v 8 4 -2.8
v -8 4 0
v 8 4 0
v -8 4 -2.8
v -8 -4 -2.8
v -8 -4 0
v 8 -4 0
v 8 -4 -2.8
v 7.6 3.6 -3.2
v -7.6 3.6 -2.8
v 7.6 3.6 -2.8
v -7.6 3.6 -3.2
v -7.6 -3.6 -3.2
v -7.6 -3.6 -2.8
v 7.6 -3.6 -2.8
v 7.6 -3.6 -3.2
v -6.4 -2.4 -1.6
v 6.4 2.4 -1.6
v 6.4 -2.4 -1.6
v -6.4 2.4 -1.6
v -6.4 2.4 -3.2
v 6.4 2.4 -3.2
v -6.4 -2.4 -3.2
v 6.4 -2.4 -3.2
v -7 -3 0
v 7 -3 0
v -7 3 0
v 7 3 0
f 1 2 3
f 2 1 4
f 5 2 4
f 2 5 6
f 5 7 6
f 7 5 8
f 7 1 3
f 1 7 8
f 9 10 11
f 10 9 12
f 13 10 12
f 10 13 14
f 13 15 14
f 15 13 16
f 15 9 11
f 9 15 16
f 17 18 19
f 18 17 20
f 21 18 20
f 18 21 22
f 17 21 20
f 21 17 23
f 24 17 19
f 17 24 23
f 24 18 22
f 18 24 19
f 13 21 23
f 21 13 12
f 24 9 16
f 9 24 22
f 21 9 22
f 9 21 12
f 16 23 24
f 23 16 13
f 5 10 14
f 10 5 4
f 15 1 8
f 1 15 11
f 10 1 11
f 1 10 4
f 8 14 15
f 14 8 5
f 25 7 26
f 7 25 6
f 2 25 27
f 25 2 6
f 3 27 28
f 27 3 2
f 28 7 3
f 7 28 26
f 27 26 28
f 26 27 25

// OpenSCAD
// file: ../p/4-4edge.scad
use <../lib.scad>
$fa=1; $fs=0.2;
function ldraw_lib__4_4edge(realsolid=false) = [
// 0 Circle 1.0
// 0 Name: 4-4edge.dat
// 0 Author: James Jessiman
// 0 !LDRAW_ORG Primitive UPDATE 2017-01
// 0 !LICENSE Licensed under CC BY 2.0 and CC BY 4.0 : see CAreadme.txt
// 
// 0 BFC CERTIFY CCW
  [0,"BFC","CERTIFY"],
  [0,"BFC","CCW"],
// 
// 0 !HISTORY 1998-12-15 [PTadmin] Official Update 1998-10
// 0 !HISTORY 2005-12-28 [PTadmin] Official Update 2005-01
// 0 !HISTORY 2007-06-24 [PTadmin] Header formatted for Contributor Agreement
// 0 !HISTORY 2008-07-01 [PTadmin] Official Update 2008-01
// 0 !HISTORY 2017-01-15 [Steffen] BFCed
// 0 !HISTORY 2017-12-30 [PTadmin] Official Update 2017-01
// 
// 
// 2 24 1 0 0 0.9239 0 0.3827
  [2,24,1,0,0,0.9239,0,0.3827],
// 2 24 0.9239 0 0.3827 0.7071 0 0.7071
  [2,24,0.9239,0,0.3827,0.7071,0,0.7071],
// 2 24 0.7071 0 0.7071 0.3827 0 0.9239
  [2,24,0.7071,0,0.7071,0.3827,0,0.9239],
// 2 24 0.3827 0 0.9239 0 0 1
  [2,24,0.3827,0,0.9239,0,0,1],
// 2 24 0 0 1 -0.3827 0 0.9239
  [2,24,0,0,1,-0.3827,0,0.9239],
// 2 24 -0.3827 0 0.9239 -0.7071 0 0.7071
  [2,24,-0.3827,0,0.9239,-0.7071,0,0.7071],
// 2 24 -0.7071 0 0.7071 -0.9239 0 0.3827
  [2,24,-0.7071,0,0.7071,-0.9239,0,0.3827],
// 2 24 -0.9239 0 0.3827 -1 0 -0
  [2,24,-0.9239,0,0.3827,-1,0,-0],
// 2 24 -1 0 -0 -0.9239 0 -0.3827
  [2,24,-1,0,-0,-0.9239,0,-0.3827],
// 2 24 -0.9239 0 -0.3827 -0.7071 0 -0.7071
  [2,24,-0.9239,0,-0.3827,-0.7071,0,-0.7071],
// 2 24 -0.7071 0 -0.7071 -0.3827 0 -0.9239
  [2,24,-0.7071,0,-0.7071,-0.3827,0,-0.9239],
// 2 24 -0.3827 0 -0.9239 0 0 -1
  [2,24,-0.3827,0,-0.9239,0,0,-1],
// 2 24 0 0 -1 0.3827 0 -0.9239
  [2,24,0,0,-1,0.3827,0,-0.9239],
// 2 24 0.3827 0 -0.9239 0.7071 0 -0.7071
  [2,24,0.3827,0,-0.9239,0.7071,0,-0.7071],
// 2 24 0.7071 0 -0.7071 0.9239 0 -0.3827
  [2,24,0.7071,0,-0.7071,0.9239,0,-0.3827],
// 2 24 0.9239 0 -0.3827 1 0 0
  [2,24,0.9239,0,-0.3827,1,0,0],
];
module ldraw_lib__4_4edge(step=0, col=false, unit=2/5, alt=false, line=0.2, solid=!$preview)
    makepoly(ldraw_lib__4_4edge(solid), step=step, col=col, unit=unit, alt=alt, line=line, solid=solid);
ldraw_lib__4_4edge(line=0.2);
// file: ../p/4-4disc.scad
use <../lib.scad>
$fa=1; $fs=0.2;
function ldraw_lib__4_4disc(realsolid=false) = [
// 0 Disc 1.0
// 0 Name: 4-4disc.dat
// 0 Author: James Jessiman
// 0 !LDRAW_ORG Primitive UPDATE 2002-02
// 0 !LICENSE Licensed under CC BY 2.0 and CC BY 4.0 : see CAreadme.txt
// 
// 0 BFC CERTIFY CCW
  [0,"BFC","CERTIFY"],
  [0,"BFC","CCW"],
// 
// 0 !HISTORY 1998-12-15 [PTadmin] Official Update 1998-10
// 0 !HISTORY 2002-03-23 [sbliss] Added BFC statement
// 0 !HISTORY 2002-04-25 [PTadmin] Official Update 2002-02
// 0 !HISTORY 2007-06-24 [PTadmin] Header formatted for Contributor Agreement
// 0 !HISTORY 2008-07-01 [PTadmin] Official Update 2008-01
// 
// 
// 3 16 0 0 0 1 0 0 0.9239 0 0.3827
  [3,16,0,0,0,1,0,0,0.9239,0,0.3827],
// 3 16 0 0 0 0.9239 0 0.3827 0.7071 0 0.7071
  [3,16,0,0,0,0.9239,0,0.3827,0.7071,0,0.7071],
// 3 16 0 0 0 0.7071 0 0.7071 0.3827 0 0.9239
  [3,16,0,0,0,0.7071,0,0.7071,0.3827,0,0.9239],
// 3 16 0 0 0 0.3827 0 0.9239 0 0 1
  [3,16,0,0,0,0.3827,0,0.9239,0,0,1],
// 3 16 0 0 0 0 0 1 -0.3827 0 0.9239
  [3,16,0,0,0,0,0,1,-0.3827,0,0.9239],
// 3 16 0 0 0 -0.3827 0 0.9239 -0.7071 0 0.7071
  [3,16,0,0,0,-0.3827,0,0.9239,-0.7071,0,0.7071],
// 3 16 0 0 0 -0.7071 0 0.7071 -0.9239 0 0.3827
  [3,16,0,0,0,-0.7071,0,0.7071,-0.9239,0,0.3827],
// 3 16 0 0 0 -0.9239 0 0.3827 -1 0 -0
  [3,16,0,0,0,-0.9239,0,0.3827,-1,0,-0],
// 3 16 0 0 0 -1 0 -0 -0.9239 0 -0.3827
  [3,16,0,0,0,-1,0,-0,-0.9239,0,-0.3827],
// 3 16 0 0 0 -0.9239 0 -0.3827 -0.7071 0 -0.7071
  [3,16,0,0,0,-0.9239,0,-0.3827,-0.7071,0,-0.7071],
// 3 16 0 0 0 -0.7071 0 -0.7071 -0.3827 0 -0.9239
  [3,16,0,0,0,-0.7071,0,-0.7071,-0.3827,0,-0.9239],
// 3 16 0 0 0 -0.3827 0 -0.9239 0 0 -1
  [3,16,0,0,0,-0.3827,0,-0.9239,0,0,-1],
// 3 16 0 0 0 0 0 -1 0.3827 0 -0.9239
  [3,16,0,0,0,0,0,-1,0.3827,0,-0.9239],
// 3 16 0 0 0 0.3827 0 -0.9239 0.7071 0 -0.7071
  [3,16,0,0,0,0.3827,0,-0.9239,0.7071,0,-0.7071],
// 3 16 0 0 0 0.7071 0 -0.7071 0.9239 0 -0.3827
  [3,16,0,0,0,0.7071,0,-0.7071,0.9239,0,-0.3827],
// 3 16 0 0 0 0.9239 0 -0.3827 1 0 0
  [3,16,0,0,0,0.9239,0,-0.3827,1,0,0],
// 0
];
module ldraw_lib__4_4disc(step=0, col=false, unit=2/5, alt=false, line=0.2, solid=!$preview)
    makepoly(ldraw_lib__4_4disc(solid), step=step, col=col, unit=unit, alt=alt, line=line, solid=solid);
ldraw_lib__4_4disc(line=0.2);
// file: ../p/4-4cyli.scad
use <../lib.scad>
$fa=1; $fs=0.2;
function ldraw_lib__4_4cyli(realsolid=false) = [
// 0 Cylinder 1.0
// 0 Name: 4-4cyli.dat
// 0 Author: James Jessiman
// 0 !LDRAW_ORG Primitive UPDATE 2005-01
// 0 !LICENSE Licensed under CC BY 2.0 and CC BY 4.0 : see CAreadme.txt
// 
// 0 BFC CERTIFY CCW
  [0,"BFC","CERTIFY"],
  [0,"BFC","CCW"],
// 
// 0 !HISTORY 1998-12-15 [PTadmin] Official Update 1998-10
// 0 !HISTORY 2002-03-23 [sbliss] Added BFC statement; merged headers from files in distributions LDraw 0.27 and Complete.
// 0 !HISTORY 2002-04-25 [PTadmin] Official Update 2002-02
// 0 !HISTORY 2004-12-14 [guyvivan] BFC CCW
// 0 !HISTORY 2005-12-28 [PTadmin] Official Update 2005-01
// 0 !HISTORY 2007-06-24 [PTadmin] Header formatted for Contributor Agreement
// 0 !HISTORY 2008-07-01 [PTadmin] Official Update 2008-01
// 
// 
// 4 16 1 1 0 0.9239 1 0.3827 0.9239 0 0.3827 1 0 0
  [4,16,1,1,0,0.9239,1,0.3827,0.9239,0,0.3827,1,0,0],
// 5 24 1 0 0 1 1 0 0.9239 0 0.3827 0.9239 0 -0.3827
  [5,24,1,0,0,1,1,0,0.9239,0,0.3827,0.9239,0,-0.3827],
// 4 16 0.9239 1 0.3827 0.7071 1 0.7071 0.7071 0 0.7071 0.9239 0 0.3827
  [4,16,0.9239,1,0.3827,0.7071,1,0.7071,0.7071,0,0.7071,0.9239,0,0.3827],
// 5 24 0.9239 0 0.3827 0.9239 1 0.3827 0.7071 0 0.7071 1 0 0
  [5,24,0.9239,0,0.3827,0.9239,1,0.3827,0.7071,0,0.7071,1,0,0],
// 4 16 0.7071 1 0.7071 0.3827 1 0.9239 0.3827 0 0.9239 0.7071 0 0.7071
  [4,16,0.7071,1,0.7071,0.3827,1,0.9239,0.3827,0,0.9239,0.7071,0,0.7071],
// 5 24 0.7071 0 0.7071 0.7071 1 0.7071 0.3827 0 0.9239 0.9239 0 0.3827
  [5,24,0.7071,0,0.7071,0.7071,1,0.7071,0.3827,0,0.9239,0.9239,0,0.3827],
// 4 16 0.3827 1 0.9239 0 1 1 0 0 1 0.3827 0 0.9239
  [4,16,0.3827,1,0.9239,0,1,1,0,0,1,0.3827,0,0.9239],
// 5 24 0.3827 0 0.9239 0.3827 1 0.9239 0 0 1 0.7071 0 0.7071
  [5,24,0.3827,0,0.9239,0.3827,1,0.9239,0,0,1,0.7071,0,0.7071],
// 4 16 0 1 1 -0.3827 1 0.9239 -0.3827 0 0.9239 0 0 1
  [4,16,0,1,1,-0.3827,1,0.9239,-0.3827,0,0.9239,0,0,1],
// 5 24 0 0 1 0 1 1 -0.3827 0 0.9239 0.3827 0 0.9239
  [5,24,0,0,1,0,1,1,-0.3827,0,0.9239,0.3827,0,0.9239],
// 4 16 -0.3827 1 0.9239 -0.7071 1 0.7071 -0.7071 0 0.7071 -0.3827 0 0.9239
  [4,16,-0.3827,1,0.9239,-0.7071,1,0.7071,-0.7071,0,0.7071,-0.3827,0,0.9239],
// 5 24 -0.3827 0 0.9239 -0.3827 1 0.9239 -0.7071 0 0.7071 0 0 1
  [5,24,-0.3827,0,0.9239,-0.3827,1,0.9239,-0.7071,0,0.7071,0,0,1],
// 4 16 -0.7071 1 0.7071 -0.9239 1 0.3827 -0.9239 0 0.3827 -0.7071 0 0.7071
  [4,16,-0.7071,1,0.7071,-0.9239,1,0.3827,-0.9239,0,0.3827,-0.7071,0,0.7071],
// 5 24 -0.7071 0 0.7071 -0.7071 1 0.7071 -0.9239 0 0.3827 -0.3827 0 0.9239
  [5,24,-0.7071,0,0.7071,-0.7071,1,0.7071,-0.9239,0,0.3827,-0.3827,0,0.9239],
// 4 16 -0.9239 1 0.3827 -1 1 0 -1 0 0 -0.9239 0 0.3827
  [4,16,-0.9239,1,0.3827,-1,1,0,-1,0,0,-0.9239,0,0.3827],
// 5 24 -0.9239 0 0.3827 -0.9239 1 0.3827 -1 0 0 -0.7071 0 0.7071
  [5,24,-0.9239,0,0.3827,-0.9239,1,0.3827,-1,0,0,-0.7071,0,0.7071],
// 4 16 -1 1 0 -0.9239 1 -0.3827 -0.9239 0 -0.3827 -1 0 0
  [4,16,-1,1,0,-0.9239,1,-0.3827,-0.9239,0,-0.3827,-1,0,0],
// 5 24 -1 0 0 -1 1 0 -0.9239 0 -0.3827 -0.9239 0 0.3827
  [5,24,-1,0,0,-1,1,0,-0.9239,0,-0.3827,-0.9239,0,0.3827],
// 4 16 -0.9239 1 -0.3827 -0.7071 1 -0.7071 -0.7071 0 -0.7071 -0.9239 0 -0.3827
  [4,16,-0.9239,1,-0.3827,-0.7071,1,-0.7071,-0.7071,0,-0.7071,-0.9239,0,-0.3827],
// 5 24 -0.9239 0 -0.3827 -0.9239 1 -0.3827 -0.7071 0 -0.7071 -1 0 0
  [5,24,-0.9239,0,-0.3827,-0.9239,1,-0.3827,-0.7071,0,-0.7071,-1,0,0],
// 4 16 -0.7071 1 -0.7071 -0.3827 1 -0.9239 -0.3827 0 -0.9239 -0.7071 0 -0.7071
  [4,16,-0.7071,1,-0.7071,-0.3827,1,-0.9239,-0.3827,0,-0.9239,-0.7071,0,-0.7071],
// 5 24 -0.7071 0 -0.7071 -0.7071 1 -0.7071 -0.3827 0 -0.9239 -0.9239 0 -0.3827
  [5,24,-0.7071,0,-0.7071,-0.7071,1,-0.7071,-0.3827,0,-0.9239,-0.9239,0,-0.3827],
// 4 16 -0.3827 1 -0.9239 0 1 -1 0 0 -1 -0.3827 0 -0.9239
  [4,16,-0.3827,1,-0.9239,0,1,-1,0,0,-1,-0.3827,0,-0.9239],
// 5 24 -0.3827 0 -0.9239 -0.3827 1 -0.9239 0 0 -1 -0.7071 0 -0.7071
  [5,24,-0.3827,0,-0.9239,-0.3827,1,-0.9239,0,0,-1,-0.7071,0,-0.7071],
// 4 16 0 1 -1 0.3827 1 -0.9239 0.3827 0 -0.9239 0 0 -1
  [4,16,0,1,-1,0.3827,1,-0.9239,0.3827,0,-0.9239,0,0,-1],
// 5 24 0 0 -1 0 1 -1 0.3827 0 -0.9239 -0.3827 0 -0.9239
  [5,24,0,0,-1,0,1,-1,0.3827,0,-0.9239,-0.3827,0,-0.9239],
// 4 16 0.3827 1 -0.9239 0.7071 1 -0.7071 0.7071 0 -0.7071 0.3827 0 -0.9239
  [4,16,0.3827,1,-0.9239,0.7071,1,-0.7071,0.7071,0,-0.7071,0.3827,0,-0.9239],
// 5 24 0.3827 0 -0.9239 0.3827 1 -0.9239 0.7071 0 -0.7071 0 0 -1
  [5,24,0.3827,0,-0.9239,0.3827,1,-0.9239,0.7071,0,-0.7071,0,0,-1],
// 4 16 0.7071 1 -0.7071 0.9239 1 -0.3827 0.9239 0 -0.3827 0.7071 0 -0.7071
  [4,16,0.7071,1,-0.7071,0.9239,1,-0.3827,0.9239,0,-0.3827,0.7071,0,-0.7071],
// 5 24 0.7071 0 -0.7071 0.7071 1 -0.7071 0.9239 0 -0.3827 0.3827 0 -0.9239
  [5,24,0.7071,0,-0.7071,0.7071,1,-0.7071,0.9239,0,-0.3827,0.3827,0,-0.9239],
// 4 16 0.9239 1 -0.3827 1 1 0 1 0 0 0.9239 0 -0.3827
  [4,16,0.9239,1,-0.3827,1,1,0,1,0,0,0.9239,0,-0.3827],
// 5 24 0.9239 0 -0.3827 0.9239 1 -0.3827 1 0 0 0.7071 0 -0.7071
  [5,24,0.9239,0,-0.3827,0.9239,1,-0.3827,1,0,0,0.7071,0,-0.7071],
// 0
];
module ldraw_lib__4_4cyli(step=0, col=false, unit=2/5, alt=false, line=0.2, solid=!$preview)
    makepoly(ldraw_lib__4_4cyli(solid), step=step, col=col, unit=unit, alt=alt, line=line, solid=solid);
ldraw_lib__4_4cyli(line=0.2);
// file: ../p/stud3.scad
use <../lib.scad>
use <4-4cyli.scad>
use <4-4disc.scad>
use <4-4edge.scad>
$fa=1; $fs=0.2;
function ldraw_lib__stud3(realsolid=false) = realsolid ? 
    [openscad(translate([0,0,-eps()], o=cylinder(4+eps(), r=4)),2)] : [
// 0 Stud Tube Solid
// 0 Name: stud3.dat
// 0 Author: James Jessiman
// 0 !LDRAW_ORG Primitive UPDATE 2012-01
// 0 !LICENSE Licensed under CC BY 2.0 and CC BY 4.0 : see CAreadme.txt
// 
// 0 BFC CERTIFY CCW
  [0,"BFC","CERTIFY"],
  [0,"BFC","CCW"],
// 
// 0 !HISTORY 2002-04-04 [sbliss] Modified for BFC compliance
// 0 !HISTORY 2002-04-25 [PTadmin] Official Update 2002-02
// 0 !HISTORY 2007-06-24 [PTadmin] Header formatted for Contributor Agreement
// 0 !HISTORY 2008-07-01 [PTadmin] Official Update 2008-01
// 0 !HISTORY 2012-02-16 [Philo] Changed to CCW
// 0 !HISTORY 2012-03-30 [PTadmin] Official Update 2012-01
// 
// 
// 1 16 0 -4 0 4 0 0 0 1 0 0 0 4 4-4edge.dat
  [1,16,0,-4,0,4,0,0,0,1,0,0,0,4, ldraw_lib__4_4edge(realsolid)],
// 1 16 0 0 0 4 0 0 0 1 0 0 0 4 4-4edge.dat
  [1,16,0,0,0,4,0,0,0,1,0,0,0,4, ldraw_lib__4_4edge(realsolid)],
// 1 16 0 -4 0 4 0 0 0 1 0 0 0 4 4-4disc.dat
  [1,16,0,-4,0,4,0,0,0,1,0,0,0,4, ldraw_lib__4_4disc(realsolid)],
// 1 16 0 -4 0 4 0 0 0 4 0 0 0 4 4-4cyli.dat
  [1,16,0,-4,0,4,0,0,0,4,0,0,0,4, ldraw_lib__4_4cyli(realsolid)],
];
module ldraw_lib__stud3(step=0, col=false, unit=2/5, alt=false, line=0.2, solid=!$preview)
    makepoly(ldraw_lib__stud3(solid), step=step, col=col, unit=unit, alt=alt, line=line, solid=solid);
ldraw_lib__stud3(line=0.2);
// file: ../p/stud.scad
use <../lib.scad>
use <4-4cyli.scad>
use <4-4disc.scad>
use <4-4edge.scad>
$fa=1; $fs=0.2;
function ldraw_lib__stud(realsolid=false) = realsolid ? 
    [openscad(translate([0,0,-eps()], o=cylinder(4+eps(), r=6)),2)] : [
// 0 Stud
// 0 Name: stud.dat
// 0 Author: James Jessiman
// 0 !LDRAW_ORG Primitive UPDATE 2012-01
// 0 !LICENSE Licensed under CC BY 2.0 and CC BY 4.0 : see CAreadme.txt
// 
// 0 BFC CERTIFY CCW
  [0,"BFC","CERTIFY"],
  [0,"BFC","CCW"],
// 
// 0 !HISTORY 2002-04-04 [sbliss] Modified for BFC compliance
// 0 !HISTORY 2002-04-25 [PTadmin] Official Update 2002-02
// 0 !HISTORY 2007-06-24 [PTadmin] Header formatted for Contributor Agreement
// 0 !HISTORY 2008-07-01 [PTadmin] Official Update 2008-01
// 0 !HISTORY 2012-02-16 [Philo] Changed to CCW
// 0 !HISTORY 2012-03-30 [PTadmin] Official Update 2012-01
// 
// 
// 1 16 0 0 0 6 0 0 0 1 0 0 0 6 4-4edge.dat
  [1,16,0,0,0,6,0,0,0,1,0,0,0,6, ldraw_lib__4_4edge(realsolid)],
// 1 16 0 -4 0 6 0 0 0 1 0 0 0 6 4-4edge.dat
  [1,16,0,-4,0,6,0,0,0,1,0,0,0,6, ldraw_lib__4_4edge(realsolid)],
// 1 16 0 0 0 6 0 0 0 -4 0 0 0 6 4-4cyli.dat
  [1,16,0,0,0,6,0,0,0,-4,0,0,0,6, ldraw_lib__4_4cyli(realsolid)],
// 1 16 0 -4 0 6 0 0 0 1 0 0 0 6 4-4disc.dat
  [1,16,0,-4,0,6,0,0,0,1,0,0,0,6, ldraw_lib__4_4disc(realsolid)],
];
module ldraw_lib__stud(step=0, col=false, unit=2/5, alt=false, line=0.2, solid=!$preview)
    makepoly(ldraw_lib__stud(solid), step=step, col=col, unit=unit, alt=alt, line=line, solid=solid);
ldraw_lib__stud(line=0.2);
// file: ../p/box4t.scad
use <../lib.scad>
$fa=1; $fs=0.2;
function ldraw_lib__box4t(realsolid=false) = [
// 0 Box with 4 Adjacent Faces and All Edges
// 0 Name: box4t.dat
// 0 Author: Tore Eriksson [Tore_Eriksson]
// 0 !LDRAW_ORG Primitive UPDATE 2003-02
// 0 !LICENSE Licensed under CC BY 2.0 and CC BY 4.0 : see CAreadme.txt
// 
// 0 BFC CERTIFY CCW
  [0,"BFC","CERTIFY"],
  [0,"BFC","CCW"],
// 
// 0 !HISTORY 1997-09-29 [PTadmin] Official Update 1997-15
// 0 !HISTORY 2002-08-31 [izanette] Modified with WINDZ for BFC compliance
// 0 !HISTORY 2003-08-01 [PTadmin] Official Update 2003-02
// 0 !HISTORY 2007-06-24 [PTadmin] Header formatted for Contributor Agreement
// 0 !HISTORY 2008-07-01 [PTadmin] Official Update 2008-01
// 
// 
// 2 24 1 1 1 -1 1 1
  [2,24,1,1,1,-1,1,1],
// 2 24 -1 1 1 -1 1 -1
  [2,24,-1,1,1,-1,1,-1],
// 2 24 -1 1 -1 1 1 -1
  [2,24,-1,1,-1,1,1,-1],
// 2 24 1 1 -1 1 1 1
  [2,24,1,1,-1,1,1,1],
// 2 24 1 0 1 -1 0 1
  [2,24,1,0,1,-1,0,1],
// 2 24 -1 0 1 -1 0 -1
  [2,24,-1,0,1,-1,0,-1],
// 2 24 -1 0 -1 1 0 -1
  [2,24,-1,0,-1,1,0,-1],
// 2 24 1 0 -1 1 0 1
  [2,24,1,0,-1,1,0,1],
// 2 24 1 0 1 1 1 1
  [2,24,1,0,1,1,1,1],
// 2 24 -1 0 1 -1 1 1
  [2,24,-1,0,1,-1,1,1],
// 2 24 1 0 -1 1 1 -1
  [2,24,1,0,-1,1,1,-1],
// 2 24 -1 0 -1 -1 1 -1
  [2,24,-1,0,-1,-1,1,-1],
// 4 16 1 1 1 1 1 -1 -1 1 -1 -1 1 1
  [4,16,1,1,1,1,1,-1,-1,1,-1,-1,1,1],
// 4 16 1 1 1 -1 1 1 -1 0 1 1 0 1
  [4,16,1,1,1,-1,1,1,-1,0,1,1,0,1],
// 4 16 -1 1 1 -1 1 -1 -1 0 -1 -1 0 1
  [4,16,-1,1,1,-1,1,-1,-1,0,-1,-1,0,1],
// 0 4 16 -1 1 -1 -1 0 -1 1 0 -1 1 1 -1
// 4 16 1 1 -1 1 1 1 1 0 1 1 0 -1
  [4,16,1,1,-1,1,1,1,1,0,1,1,0,-1],
// 0
];
module ldraw_lib__box4t(step=0, col=false, unit=2/5, alt=false, line=0.2, solid=!$preview)
    makepoly(ldraw_lib__box4t(solid), step=step, col=col, unit=unit, alt=alt, line=line, solid=solid);
ldraw_lib__box4t(line=0.2);
// file: s/3004s01.scad
use <../../lib.scad>
use <../../p/box4t.scad>
use <../../p/box5.scad>
use <../../p/stud.scad>
use <../../p/stud3.scad>
$fa=1; $fs=0.2;
function ldraw_lib__s__3004s01(realsolid=false) = [
// 0 ~Brick  1 x  2 without Front Face
// 0 Name: s\3004s01.dat
// 0 Author: James Jessiman
// 0 !LDRAW_ORG Subpart UPDATE 2003-03
// 0 !LICENSE Licensed under CC BY 2.0 and CC BY 4.0 : see CAreadme.txt
// 
// 0 BFC CERTIFY CCW
  [0,"BFC","CERTIFY"],
  [0,"BFC","CCW"],
// 
// 0 !HISTORY 2003-09-07 [jriley] Subfiling, BFC
// 0 !HISTORY 2003-12-19 [PTadmin] Official Update 2003-03
// 0 !HISTORY 2007-08-29 [PTadmin] Header formatted for Contributor Agreement
// 0 !HISTORY 2008-07-01 [PTadmin] Official Update 2008-01
// 
// 
// 1 16 0 4 0 1 0 0 0 -5 0 0 0 1 stud3.dat
  [1,16,0,4,0,1,0,0,0,-5,0,0,0,1, ldraw_lib__stud3(realsolid)],
// 0 BFC INVERTNEXT
  [0,"BFC","INVERTNEXT"],
// 1 16 0 24 0 16 0 0 0 -20 0 0 0 6 box5.dat
  [1,16,0,24,0,16,0,0,0,-20,0,0,0,6, ldraw_lib__box5(realsolid)],
// 4 16 20 24 10 16 24 6 -16 24 6 -20 24 10
  [4,16,20,24,10,16,24,6,-16,24,6,-20,24,10],
// 4 16 -20 24 10 -16 24 6 -16 24 -6 -20 24 -10
  [4,16,-20,24,10,-16,24,6,-16,24,-6,-20,24,-10],
// 4 16 -20 24 -10 -16 24 -6 16 24 -6 20 24 -10
  [4,16,-20,24,-10,-16,24,-6,16,24,-6,20,24,-10],
// 4 16 20 24 -10 16 24 -6 16 24 6 20 24 10
  [4,16,20,24,-10,16,24,-6,16,24,6,20,24,10],
// 1 16 0 24 0 20 0 0 0 -24 0 0 0 10 box4t.dat
  [1,16,0,24,0,20,0,0,0,-24,0,0,0,10, ldraw_lib__box4t(realsolid)],
// 1 16 10 0 0 1 0 0 0 1 0 0 0 1 stud.dat
  [1,16,10,0,0,1,0,0,0,1,0,0,0,1, ldraw_lib__stud(realsolid)],
// 1 16 -10 0 0 1 0 0 0 1 0 0 0 1 stud.dat
  [1,16,-10,0,0,1,0,0,0,1,0,0,0,1, ldraw_lib__stud(realsolid)],
// 0
];
module ldraw_lib__s__3004s01(step=0, col=false, unit=2/5, alt=false, line=0.2, solid=!$preview)
    makepoly(ldraw_lib__s__3004s01(solid), step=step, col=col, unit=unit, alt=alt, line=line, solid=solid);
ldraw_lib__s__3004s01(line=0.2);
// file: ../p/box5.scad
use <../lib.scad>
$fa=1; $fs=0.2;
function ldraw_lib__box5(realsolid=false) = [
// 0 Box with 5 Faces and All Edges
// 0 Name: box5.dat
// 0 Author: James Jessiman
// 0 !LDRAW_ORG Primitive UPDATE 2012-01
// 0 !LICENSE Licensed under CC BY 2.0 and CC BY 4.0 : see CAreadme.txt
// 
// 0 BFC CERTIFY CCW
  [0,"BFC","CERTIFY"],
  [0,"BFC","CCW"],
// 
// 0 !HISTORY 2002-04-03 [sbliss] Modified for BFC compliance
// 0 !HISTORY 2002-04-25 [PTadmin] Official Update 2002-02
// 0 !HISTORY 2007-06-24 [PTadmin] Header formatted for Contributor Agreement
// 0 !HISTORY 2008-07-01 [PTadmin] Official Update 2008-01
// 0 !HISTORY 2012-02-16 [Philo] Changed to CCW
// 0 !HISTORY 2012-03-30 [PTadmin] Official Update 2012-01
// 
// 
// 2 24 1 1 1 -1 1 1
  [2,24,1,1,1,-1,1,1],
// 2 24 -1 1 1 -1 1 -1
  [2,24,-1,1,1,-1,1,-1],
// 2 24 -1 1 -1 1 1 -1
  [2,24,-1,1,-1,1,1,-1],
// 2 24 1 1 -1 1 1 1
  [2,24,1,1,-1,1,1,1],
// 2 24 1 0 1 -1 0 1
  [2,24,1,0,1,-1,0,1],
// 2 24 -1 0 1 -1 0 -1
  [2,24,-1,0,1,-1,0,-1],
// 2 24 -1 0 -1 1 0 -1
  [2,24,-1,0,-1,1,0,-1],
// 2 24 1 0 -1 1 0 1
  [2,24,1,0,-1,1,0,1],
// 2 24 1 0 1 1 1 1
  [2,24,1,0,1,1,1,1],
// 2 24 -1 0 1 -1 1 1
  [2,24,-1,0,1,-1,1,1],
// 2 24 1 0 -1 1 1 -1
  [2,24,1,0,-1,1,1,-1],
// 2 24 -1 0 -1 -1 1 -1
  [2,24,-1,0,-1,-1,1,-1],
// 4 16 -1 1 1 1 1 1 1 1 -1 -1 1 -1
  [4,16,-1,1,1,1,1,1,1,1,-1,-1,1,-1],
// 4 16 -1 1 1 -1 0 1 1 0 1 1 1 1
  [4,16,-1,1,1,-1,0,1,1,0,1,1,1,1],
// 4 16 -1 1 -1 -1 0 -1 -1 0 1 -1 1 1
  [4,16,-1,1,-1,-1,0,-1,-1,0,1,-1,1,1],
// 4 16 1 1 -1 1 0 -1 -1 0 -1 -1 1 -1
  [4,16,1,1,-1,1,0,-1,-1,0,-1,-1,1,-1],
// 4 16 1 1 1 1 0 1 1 0 -1 1 1 -1
  [4,16,1,1,1,1,0,1,1,0,-1,1,1,-1],
];
module ldraw_lib__box5(step=0, col=false, unit=2/5, alt=false, line=0.2, solid=!$preview)
    makepoly(ldraw_lib__box5(solid), step=step, col=col, unit=unit, alt=alt, line=line, solid=solid);
ldraw_lib__box5(line=0.2);
// file: ../p/box4.scad
use <../lib.scad>
$fa=1; $fs=0.2;
function ldraw_lib__box4(realsolid=false) = [
// 0 Box with 4 Faces (2 Parallel Pairs) and All Edges
// 0 Name: box4.dat
// 0 Author: James Jessiman
// 0 !LDRAW_ORG Primitive UPDATE 2012-01
// 0 !LICENSE Licensed under CC BY 2.0 and CC BY 4.0 : see CAreadme.txt
// 
// 0 BFC CERTIFY CCW
  [0,"BFC","CERTIFY"],
  [0,"BFC","CCW"],
// 
// 0 !HISTORY 2002-04-03 [sbliss] Modified for BFC compliance
// 0 !HISTORY 2002-04-25 [PTadmin] Official Update 2002-02
// 0 !HISTORY 2007-06-24 [PTadmin] Header formatted for Contributor Agreement
// 0 !HISTORY 2008-07-01 [PTadmin] Official Update 2008-01
// 0 !HISTORY 2012-02-16 [Philo] Changed to CCW
// 0 !HISTORY 2012-03-30 [PTadmin] Official Update 2012-01
// 
// 
// 2 24 1 1 1 -1 1 1
  [2,24,1,1,1,-1,1,1],
// 2 24 -1 1 1 -1 1 -1
  [2,24,-1,1,1,-1,1,-1],
// 2 24 -1 1 -1 1 1 -1
  [2,24,-1,1,-1,1,1,-1],
// 2 24 1 1 -1 1 1 1
  [2,24,1,1,-1,1,1,1],
// 2 24 1 0 1 -1 0 1
  [2,24,1,0,1,-1,0,1],
// 2 24 -1 0 1 -1 0 -1
  [2,24,-1,0,1,-1,0,-1],
// 2 24 -1 0 -1 1 0 -1
  [2,24,-1,0,-1,1,0,-1],
// 2 24 1 0 -1 1 0 1
  [2,24,1,0,-1,1,0,1],
// 2 24 1 0 1 1 1 1
  [2,24,1,0,1,1,1,1],
// 2 24 -1 0 1 -1 1 1
  [2,24,-1,0,1,-1,1,1],
// 2 24 1 0 -1 1 1 -1
  [2,24,1,0,-1,1,1,-1],
// 2 24 -1 0 -1 -1 1 -1
  [2,24,-1,0,-1,-1,1,-1],
// 4 16 -1 1 1 -1 0 1 1 0 1 1 1 1
  [4,16,-1,1,1,-1,0,1,1,0,1,1,1,1],
// 4 16 -1 1 -1 -1 0 -1 -1 0 1 -1 1 1
  [4,16,-1,1,-1,-1,0,-1,-1,0,1,-1,1,1],
// 4 16 1 1 -1 1 0 -1 -1 0 -1 -1 1 -1
  [4,16,1,1,-1,1,0,-1,-1,0,-1,-1,1,-1],
// 4 16 1 1 1 1 0 1 1 0 -1 1 1 -1
  [4,16,1,1,1,1,0,1,1,0,-1,1,1,-1],
];
module ldraw_lib__box4(step=0, col=false, unit=2/5, alt=false, line=0.2, solid=!$preview)
    makepoly(ldraw_lib__box4(solid), step=step, col=col, unit=unit, alt=alt, line=line, solid=solid);
ldraw_lib__box4(line=0.2);
// file: 3004.scad
use <../lib.scad>
use <s/3004s01.scad>
$fa=1; $fs=0.2;
function ldraw_lib__3004(realsolid=false) = [
// 0 Brick  1 x  2
// 0 Name: 3004.dat
// 0 Author: James Jessiman
// 0 !LDRAW_ORG Part UPDATE 2022-05
// 0 !LICENSE Licensed under CC BY 2.0 and CC BY 4.0 : see CAreadme.txt
// 
// 0 BFC CERTIFY CCW
  [0,"BFC","CERTIFY"],
  [0,"BFC","CCW"],
// 
// 0 !HISTORY 2001-10-26 [PTadmin] Official Update 2001-01
// 0 !HISTORY 2002-05-07 {unknown} BFC Certification
// 0 !HISTORY 2002-06-11 [PTadmin] Official Update 2002-03
// 0 !HISTORY 2007-05-07 [PTadmin] Header formatted for Contributor Agreement
// 0 !HISTORY 2008-07-01 [PTadmin] Official Update 2008-01
// 0 !HISTORY 2022-08-04 [MagFors] Using subfile
// 0 !HISTORY 2022-09-15 [PTadmin] Official Update 2022-05
// 
// 
// 1 16 0 0 0 1 0 0 0 1 0 0 0 1 s\3004s01.dat
  [1,16,0,0,0,1,0,0,0,1,0,0,0,1, ldraw_lib__s__3004s01(realsolid)],
// 4 16 -20 24 -10 20 24 -10 20 0 -10 -20 0 -10
  [4,16,-20,24,-10,20,24,-10,20,0,-10,-20,0,-10],
];
module ldraw_lib__3004(step=0, col=false, unit=2/5, alt=false, line=0.2, solid=!$preview)
    makepoly(ldraw_lib__3004(solid), step=step, col=col, unit=unit, alt=alt, line=line, solid=solid);
ldraw_lib__3004(line=0.2);
// file: s/3069bs01.scad
use <../../lib.scad>
use <../../p/box4.scad>
use <../../p/box5.scad>
$fa=1; $fs=0.2;
function ldraw_lib__s__3069bs01(realsolid=false) = [
// 0 ~Tile  1 x  2 with Groove without Top Face
// 0 Name: s\3069bs01.dat
// 0 Author: Santeri Piippo [arezey]
// 0 !LDRAW_ORG Subpart UPDATE 2010-02
// 0 !LICENSE Licensed under CC BY 2.0 and CC BY 4.0 : see CAreadme.txt
// 
// 0 BFC CERTIFY CCW
  [0,"BFC","CERTIFY"],
  [0,"BFC","CCW"],
// 
// 0 !HISTORY 2010-07-05 [PTadmin] Official Update 2010-02
// 
// 
// 1 16 0 0 0 20 0 0 0 7 0 0 0 10 box4.dat
  [1,16,0,0,0,20,0,0,0,7,0,0,0,10, ldraw_lib__box4(realsolid)],
// 1 16 0 7 0 19 0 0 0 1 0 0 0 9 box4.dat
  [1,16,0,7,0,19,0,0,0,1,0,0,0,9, ldraw_lib__box4(realsolid)],
// 0 BFC INVERTNEXT
  [0,"BFC","INVERTNEXT"],
// 1 16 0 8 0 16 0 0 0 -4 0 0 0 6 box5.dat
  [1,16,0,8,0,16,0,0,0,-4,0,0,0,6, ldraw_lib__box5(realsolid)],
// 4 16 -19 8 9 -16 8 6 -16 8 -6 -19 8 -9
  [4,16,-19,8,9,-16,8,6,-16,8,-6,-19,8,-9],
// 4 16 19 8 -9 16 8 -6 16 8 6 19 8 9
  [4,16,19,8,-9,16,8,-6,16,8,6,19,8,9],
// 4 16 19 8 9 16 8 6 -16 8 6 -19 8 9
  [4,16,19,8,9,16,8,6,-16,8,6,-19,8,9],
// 4 16 -19 8 -9 -16 8 -6 16 8 -6 19 8 -9
  [4,16,-19,8,-9,-16,8,-6,16,8,-6,19,8,-9],
// 4 16 -20 7 10 -19 7 9 -19 7 -9 -20 7 -10
  [4,16,-20,7,10,-19,7,9,-19,7,-9,-20,7,-10],
// 4 16 20 7 -10 19 7 -9 19 7 9 20 7 10
  [4,16,20,7,-10,19,7,-9,19,7,9,20,7,10],
// 4 16 20 7 10 19 7 9 -19 7 9 -20 7 10
  [4,16,20,7,10,19,7,9,-19,7,9,-20,7,10],
// 4 16 -20 7 -10 -19 7 -9 19 7 -9 20 7 -10
  [4,16,-20,7,-10,-19,7,-9,19,7,-9,20,7,-10],
// 0 //
];
module ldraw_lib__s__3069bs01(step=0, col=false, unit=2/5, alt=false, line=0.2, solid=!$preview)
    makepoly(ldraw_lib__s__3069bs01(solid), step=step, col=col, unit=unit, alt=alt, line=line, solid=solid);
ldraw_lib__s__3069bs01(line=0.2);
// main file
use <../lib.scad>
use <s/3069bs01.scad>
$fa=1; $fs=0.2;
function ldraw_lib__3069bpf6(realsolid=false) = [
// 0 Tile  1 x  2 with Purple Rectangle with White Border Pattern
// 0 Name: 3069bpf6.dat
// 0 Author: Steffen [Steffen]
// 0 !LDRAW_ORG Part UPDATE 2018-02
// 0 !LICENSE Licensed under CC BY 2.0 and CC BY 4.0 : see CAreadme.txt
// 
// 0 BFC CERTIFY CCW
  [0,"BFC","CERTIFY"],
  [0,"BFC","CCW"],
// 
// 0 !KEYWORDS Scala, set 4307
// 
// 0 !CMDLINE -c0
// 
// 0 !HISTORY 2018-01-21 [Steffen] created based on 3069bpf2 by Niels Karsdorp [nielsk]
// 0 !HISTORY 2018-12-08 [PTadmin] Official Update 2018-02
// 
// 
// 1 16 0 0 0 1 0 0 0 1 0 0 0 1 s\3069bs01.dat
  [1,16,0,0,0,1,0,0,0,1,0,0,0,1, ldraw_lib__s__3069bs01(realsolid)],
// 4 15 -20 0 -10 20 0 -10 17.5 0 -7.5 -17.5 0 -7.5
  [4,15,-20,0,-10,20,0,-10,17.5,0,-7.5,-17.5,0,-7.5],
// 4 15 -20 0 10 -20 0 -10 -17.5 0 -7.5 -17.5 0 7.5
  [4,15,-20,0,10,-20,0,-10,-17.5,0,-7.5,-17.5,0,7.5],
// 4 15 20 0 10 -20 0 10 -17.5 0 7.5 17.5 0 7.5
  [4,15,20,0,10,-20,0,10,-17.5,0,7.5,17.5,0,7.5],
// 4 15 20 0 -10 20 0 10 17.5 0 7.5 17.5 0 -7.5
  [4,15,20,0,-10,20,0,10,17.5,0,7.5,17.5,0,-7.5],
// 4 22 -17.5 0 -7.5 17.5 0 -7.5 17.5 0 7.5 -17.5 0 7.5
  [4,22,-17.5,0,-7.5,17.5,0,-7.5,17.5,0,7.5,-17.5,0,7.5],
];
module ldraw_lib__3069bpf6(step=0, col=false, unit=2/5, alt=false, line=0.2, solid=!$preview)
    makepoly(ldraw_lib__3069bpf6(solid), step=step, col=col, unit=unit, alt=alt, line=line, solid=solid);
ldraw_lib__3069bpf6(line=0.2);
